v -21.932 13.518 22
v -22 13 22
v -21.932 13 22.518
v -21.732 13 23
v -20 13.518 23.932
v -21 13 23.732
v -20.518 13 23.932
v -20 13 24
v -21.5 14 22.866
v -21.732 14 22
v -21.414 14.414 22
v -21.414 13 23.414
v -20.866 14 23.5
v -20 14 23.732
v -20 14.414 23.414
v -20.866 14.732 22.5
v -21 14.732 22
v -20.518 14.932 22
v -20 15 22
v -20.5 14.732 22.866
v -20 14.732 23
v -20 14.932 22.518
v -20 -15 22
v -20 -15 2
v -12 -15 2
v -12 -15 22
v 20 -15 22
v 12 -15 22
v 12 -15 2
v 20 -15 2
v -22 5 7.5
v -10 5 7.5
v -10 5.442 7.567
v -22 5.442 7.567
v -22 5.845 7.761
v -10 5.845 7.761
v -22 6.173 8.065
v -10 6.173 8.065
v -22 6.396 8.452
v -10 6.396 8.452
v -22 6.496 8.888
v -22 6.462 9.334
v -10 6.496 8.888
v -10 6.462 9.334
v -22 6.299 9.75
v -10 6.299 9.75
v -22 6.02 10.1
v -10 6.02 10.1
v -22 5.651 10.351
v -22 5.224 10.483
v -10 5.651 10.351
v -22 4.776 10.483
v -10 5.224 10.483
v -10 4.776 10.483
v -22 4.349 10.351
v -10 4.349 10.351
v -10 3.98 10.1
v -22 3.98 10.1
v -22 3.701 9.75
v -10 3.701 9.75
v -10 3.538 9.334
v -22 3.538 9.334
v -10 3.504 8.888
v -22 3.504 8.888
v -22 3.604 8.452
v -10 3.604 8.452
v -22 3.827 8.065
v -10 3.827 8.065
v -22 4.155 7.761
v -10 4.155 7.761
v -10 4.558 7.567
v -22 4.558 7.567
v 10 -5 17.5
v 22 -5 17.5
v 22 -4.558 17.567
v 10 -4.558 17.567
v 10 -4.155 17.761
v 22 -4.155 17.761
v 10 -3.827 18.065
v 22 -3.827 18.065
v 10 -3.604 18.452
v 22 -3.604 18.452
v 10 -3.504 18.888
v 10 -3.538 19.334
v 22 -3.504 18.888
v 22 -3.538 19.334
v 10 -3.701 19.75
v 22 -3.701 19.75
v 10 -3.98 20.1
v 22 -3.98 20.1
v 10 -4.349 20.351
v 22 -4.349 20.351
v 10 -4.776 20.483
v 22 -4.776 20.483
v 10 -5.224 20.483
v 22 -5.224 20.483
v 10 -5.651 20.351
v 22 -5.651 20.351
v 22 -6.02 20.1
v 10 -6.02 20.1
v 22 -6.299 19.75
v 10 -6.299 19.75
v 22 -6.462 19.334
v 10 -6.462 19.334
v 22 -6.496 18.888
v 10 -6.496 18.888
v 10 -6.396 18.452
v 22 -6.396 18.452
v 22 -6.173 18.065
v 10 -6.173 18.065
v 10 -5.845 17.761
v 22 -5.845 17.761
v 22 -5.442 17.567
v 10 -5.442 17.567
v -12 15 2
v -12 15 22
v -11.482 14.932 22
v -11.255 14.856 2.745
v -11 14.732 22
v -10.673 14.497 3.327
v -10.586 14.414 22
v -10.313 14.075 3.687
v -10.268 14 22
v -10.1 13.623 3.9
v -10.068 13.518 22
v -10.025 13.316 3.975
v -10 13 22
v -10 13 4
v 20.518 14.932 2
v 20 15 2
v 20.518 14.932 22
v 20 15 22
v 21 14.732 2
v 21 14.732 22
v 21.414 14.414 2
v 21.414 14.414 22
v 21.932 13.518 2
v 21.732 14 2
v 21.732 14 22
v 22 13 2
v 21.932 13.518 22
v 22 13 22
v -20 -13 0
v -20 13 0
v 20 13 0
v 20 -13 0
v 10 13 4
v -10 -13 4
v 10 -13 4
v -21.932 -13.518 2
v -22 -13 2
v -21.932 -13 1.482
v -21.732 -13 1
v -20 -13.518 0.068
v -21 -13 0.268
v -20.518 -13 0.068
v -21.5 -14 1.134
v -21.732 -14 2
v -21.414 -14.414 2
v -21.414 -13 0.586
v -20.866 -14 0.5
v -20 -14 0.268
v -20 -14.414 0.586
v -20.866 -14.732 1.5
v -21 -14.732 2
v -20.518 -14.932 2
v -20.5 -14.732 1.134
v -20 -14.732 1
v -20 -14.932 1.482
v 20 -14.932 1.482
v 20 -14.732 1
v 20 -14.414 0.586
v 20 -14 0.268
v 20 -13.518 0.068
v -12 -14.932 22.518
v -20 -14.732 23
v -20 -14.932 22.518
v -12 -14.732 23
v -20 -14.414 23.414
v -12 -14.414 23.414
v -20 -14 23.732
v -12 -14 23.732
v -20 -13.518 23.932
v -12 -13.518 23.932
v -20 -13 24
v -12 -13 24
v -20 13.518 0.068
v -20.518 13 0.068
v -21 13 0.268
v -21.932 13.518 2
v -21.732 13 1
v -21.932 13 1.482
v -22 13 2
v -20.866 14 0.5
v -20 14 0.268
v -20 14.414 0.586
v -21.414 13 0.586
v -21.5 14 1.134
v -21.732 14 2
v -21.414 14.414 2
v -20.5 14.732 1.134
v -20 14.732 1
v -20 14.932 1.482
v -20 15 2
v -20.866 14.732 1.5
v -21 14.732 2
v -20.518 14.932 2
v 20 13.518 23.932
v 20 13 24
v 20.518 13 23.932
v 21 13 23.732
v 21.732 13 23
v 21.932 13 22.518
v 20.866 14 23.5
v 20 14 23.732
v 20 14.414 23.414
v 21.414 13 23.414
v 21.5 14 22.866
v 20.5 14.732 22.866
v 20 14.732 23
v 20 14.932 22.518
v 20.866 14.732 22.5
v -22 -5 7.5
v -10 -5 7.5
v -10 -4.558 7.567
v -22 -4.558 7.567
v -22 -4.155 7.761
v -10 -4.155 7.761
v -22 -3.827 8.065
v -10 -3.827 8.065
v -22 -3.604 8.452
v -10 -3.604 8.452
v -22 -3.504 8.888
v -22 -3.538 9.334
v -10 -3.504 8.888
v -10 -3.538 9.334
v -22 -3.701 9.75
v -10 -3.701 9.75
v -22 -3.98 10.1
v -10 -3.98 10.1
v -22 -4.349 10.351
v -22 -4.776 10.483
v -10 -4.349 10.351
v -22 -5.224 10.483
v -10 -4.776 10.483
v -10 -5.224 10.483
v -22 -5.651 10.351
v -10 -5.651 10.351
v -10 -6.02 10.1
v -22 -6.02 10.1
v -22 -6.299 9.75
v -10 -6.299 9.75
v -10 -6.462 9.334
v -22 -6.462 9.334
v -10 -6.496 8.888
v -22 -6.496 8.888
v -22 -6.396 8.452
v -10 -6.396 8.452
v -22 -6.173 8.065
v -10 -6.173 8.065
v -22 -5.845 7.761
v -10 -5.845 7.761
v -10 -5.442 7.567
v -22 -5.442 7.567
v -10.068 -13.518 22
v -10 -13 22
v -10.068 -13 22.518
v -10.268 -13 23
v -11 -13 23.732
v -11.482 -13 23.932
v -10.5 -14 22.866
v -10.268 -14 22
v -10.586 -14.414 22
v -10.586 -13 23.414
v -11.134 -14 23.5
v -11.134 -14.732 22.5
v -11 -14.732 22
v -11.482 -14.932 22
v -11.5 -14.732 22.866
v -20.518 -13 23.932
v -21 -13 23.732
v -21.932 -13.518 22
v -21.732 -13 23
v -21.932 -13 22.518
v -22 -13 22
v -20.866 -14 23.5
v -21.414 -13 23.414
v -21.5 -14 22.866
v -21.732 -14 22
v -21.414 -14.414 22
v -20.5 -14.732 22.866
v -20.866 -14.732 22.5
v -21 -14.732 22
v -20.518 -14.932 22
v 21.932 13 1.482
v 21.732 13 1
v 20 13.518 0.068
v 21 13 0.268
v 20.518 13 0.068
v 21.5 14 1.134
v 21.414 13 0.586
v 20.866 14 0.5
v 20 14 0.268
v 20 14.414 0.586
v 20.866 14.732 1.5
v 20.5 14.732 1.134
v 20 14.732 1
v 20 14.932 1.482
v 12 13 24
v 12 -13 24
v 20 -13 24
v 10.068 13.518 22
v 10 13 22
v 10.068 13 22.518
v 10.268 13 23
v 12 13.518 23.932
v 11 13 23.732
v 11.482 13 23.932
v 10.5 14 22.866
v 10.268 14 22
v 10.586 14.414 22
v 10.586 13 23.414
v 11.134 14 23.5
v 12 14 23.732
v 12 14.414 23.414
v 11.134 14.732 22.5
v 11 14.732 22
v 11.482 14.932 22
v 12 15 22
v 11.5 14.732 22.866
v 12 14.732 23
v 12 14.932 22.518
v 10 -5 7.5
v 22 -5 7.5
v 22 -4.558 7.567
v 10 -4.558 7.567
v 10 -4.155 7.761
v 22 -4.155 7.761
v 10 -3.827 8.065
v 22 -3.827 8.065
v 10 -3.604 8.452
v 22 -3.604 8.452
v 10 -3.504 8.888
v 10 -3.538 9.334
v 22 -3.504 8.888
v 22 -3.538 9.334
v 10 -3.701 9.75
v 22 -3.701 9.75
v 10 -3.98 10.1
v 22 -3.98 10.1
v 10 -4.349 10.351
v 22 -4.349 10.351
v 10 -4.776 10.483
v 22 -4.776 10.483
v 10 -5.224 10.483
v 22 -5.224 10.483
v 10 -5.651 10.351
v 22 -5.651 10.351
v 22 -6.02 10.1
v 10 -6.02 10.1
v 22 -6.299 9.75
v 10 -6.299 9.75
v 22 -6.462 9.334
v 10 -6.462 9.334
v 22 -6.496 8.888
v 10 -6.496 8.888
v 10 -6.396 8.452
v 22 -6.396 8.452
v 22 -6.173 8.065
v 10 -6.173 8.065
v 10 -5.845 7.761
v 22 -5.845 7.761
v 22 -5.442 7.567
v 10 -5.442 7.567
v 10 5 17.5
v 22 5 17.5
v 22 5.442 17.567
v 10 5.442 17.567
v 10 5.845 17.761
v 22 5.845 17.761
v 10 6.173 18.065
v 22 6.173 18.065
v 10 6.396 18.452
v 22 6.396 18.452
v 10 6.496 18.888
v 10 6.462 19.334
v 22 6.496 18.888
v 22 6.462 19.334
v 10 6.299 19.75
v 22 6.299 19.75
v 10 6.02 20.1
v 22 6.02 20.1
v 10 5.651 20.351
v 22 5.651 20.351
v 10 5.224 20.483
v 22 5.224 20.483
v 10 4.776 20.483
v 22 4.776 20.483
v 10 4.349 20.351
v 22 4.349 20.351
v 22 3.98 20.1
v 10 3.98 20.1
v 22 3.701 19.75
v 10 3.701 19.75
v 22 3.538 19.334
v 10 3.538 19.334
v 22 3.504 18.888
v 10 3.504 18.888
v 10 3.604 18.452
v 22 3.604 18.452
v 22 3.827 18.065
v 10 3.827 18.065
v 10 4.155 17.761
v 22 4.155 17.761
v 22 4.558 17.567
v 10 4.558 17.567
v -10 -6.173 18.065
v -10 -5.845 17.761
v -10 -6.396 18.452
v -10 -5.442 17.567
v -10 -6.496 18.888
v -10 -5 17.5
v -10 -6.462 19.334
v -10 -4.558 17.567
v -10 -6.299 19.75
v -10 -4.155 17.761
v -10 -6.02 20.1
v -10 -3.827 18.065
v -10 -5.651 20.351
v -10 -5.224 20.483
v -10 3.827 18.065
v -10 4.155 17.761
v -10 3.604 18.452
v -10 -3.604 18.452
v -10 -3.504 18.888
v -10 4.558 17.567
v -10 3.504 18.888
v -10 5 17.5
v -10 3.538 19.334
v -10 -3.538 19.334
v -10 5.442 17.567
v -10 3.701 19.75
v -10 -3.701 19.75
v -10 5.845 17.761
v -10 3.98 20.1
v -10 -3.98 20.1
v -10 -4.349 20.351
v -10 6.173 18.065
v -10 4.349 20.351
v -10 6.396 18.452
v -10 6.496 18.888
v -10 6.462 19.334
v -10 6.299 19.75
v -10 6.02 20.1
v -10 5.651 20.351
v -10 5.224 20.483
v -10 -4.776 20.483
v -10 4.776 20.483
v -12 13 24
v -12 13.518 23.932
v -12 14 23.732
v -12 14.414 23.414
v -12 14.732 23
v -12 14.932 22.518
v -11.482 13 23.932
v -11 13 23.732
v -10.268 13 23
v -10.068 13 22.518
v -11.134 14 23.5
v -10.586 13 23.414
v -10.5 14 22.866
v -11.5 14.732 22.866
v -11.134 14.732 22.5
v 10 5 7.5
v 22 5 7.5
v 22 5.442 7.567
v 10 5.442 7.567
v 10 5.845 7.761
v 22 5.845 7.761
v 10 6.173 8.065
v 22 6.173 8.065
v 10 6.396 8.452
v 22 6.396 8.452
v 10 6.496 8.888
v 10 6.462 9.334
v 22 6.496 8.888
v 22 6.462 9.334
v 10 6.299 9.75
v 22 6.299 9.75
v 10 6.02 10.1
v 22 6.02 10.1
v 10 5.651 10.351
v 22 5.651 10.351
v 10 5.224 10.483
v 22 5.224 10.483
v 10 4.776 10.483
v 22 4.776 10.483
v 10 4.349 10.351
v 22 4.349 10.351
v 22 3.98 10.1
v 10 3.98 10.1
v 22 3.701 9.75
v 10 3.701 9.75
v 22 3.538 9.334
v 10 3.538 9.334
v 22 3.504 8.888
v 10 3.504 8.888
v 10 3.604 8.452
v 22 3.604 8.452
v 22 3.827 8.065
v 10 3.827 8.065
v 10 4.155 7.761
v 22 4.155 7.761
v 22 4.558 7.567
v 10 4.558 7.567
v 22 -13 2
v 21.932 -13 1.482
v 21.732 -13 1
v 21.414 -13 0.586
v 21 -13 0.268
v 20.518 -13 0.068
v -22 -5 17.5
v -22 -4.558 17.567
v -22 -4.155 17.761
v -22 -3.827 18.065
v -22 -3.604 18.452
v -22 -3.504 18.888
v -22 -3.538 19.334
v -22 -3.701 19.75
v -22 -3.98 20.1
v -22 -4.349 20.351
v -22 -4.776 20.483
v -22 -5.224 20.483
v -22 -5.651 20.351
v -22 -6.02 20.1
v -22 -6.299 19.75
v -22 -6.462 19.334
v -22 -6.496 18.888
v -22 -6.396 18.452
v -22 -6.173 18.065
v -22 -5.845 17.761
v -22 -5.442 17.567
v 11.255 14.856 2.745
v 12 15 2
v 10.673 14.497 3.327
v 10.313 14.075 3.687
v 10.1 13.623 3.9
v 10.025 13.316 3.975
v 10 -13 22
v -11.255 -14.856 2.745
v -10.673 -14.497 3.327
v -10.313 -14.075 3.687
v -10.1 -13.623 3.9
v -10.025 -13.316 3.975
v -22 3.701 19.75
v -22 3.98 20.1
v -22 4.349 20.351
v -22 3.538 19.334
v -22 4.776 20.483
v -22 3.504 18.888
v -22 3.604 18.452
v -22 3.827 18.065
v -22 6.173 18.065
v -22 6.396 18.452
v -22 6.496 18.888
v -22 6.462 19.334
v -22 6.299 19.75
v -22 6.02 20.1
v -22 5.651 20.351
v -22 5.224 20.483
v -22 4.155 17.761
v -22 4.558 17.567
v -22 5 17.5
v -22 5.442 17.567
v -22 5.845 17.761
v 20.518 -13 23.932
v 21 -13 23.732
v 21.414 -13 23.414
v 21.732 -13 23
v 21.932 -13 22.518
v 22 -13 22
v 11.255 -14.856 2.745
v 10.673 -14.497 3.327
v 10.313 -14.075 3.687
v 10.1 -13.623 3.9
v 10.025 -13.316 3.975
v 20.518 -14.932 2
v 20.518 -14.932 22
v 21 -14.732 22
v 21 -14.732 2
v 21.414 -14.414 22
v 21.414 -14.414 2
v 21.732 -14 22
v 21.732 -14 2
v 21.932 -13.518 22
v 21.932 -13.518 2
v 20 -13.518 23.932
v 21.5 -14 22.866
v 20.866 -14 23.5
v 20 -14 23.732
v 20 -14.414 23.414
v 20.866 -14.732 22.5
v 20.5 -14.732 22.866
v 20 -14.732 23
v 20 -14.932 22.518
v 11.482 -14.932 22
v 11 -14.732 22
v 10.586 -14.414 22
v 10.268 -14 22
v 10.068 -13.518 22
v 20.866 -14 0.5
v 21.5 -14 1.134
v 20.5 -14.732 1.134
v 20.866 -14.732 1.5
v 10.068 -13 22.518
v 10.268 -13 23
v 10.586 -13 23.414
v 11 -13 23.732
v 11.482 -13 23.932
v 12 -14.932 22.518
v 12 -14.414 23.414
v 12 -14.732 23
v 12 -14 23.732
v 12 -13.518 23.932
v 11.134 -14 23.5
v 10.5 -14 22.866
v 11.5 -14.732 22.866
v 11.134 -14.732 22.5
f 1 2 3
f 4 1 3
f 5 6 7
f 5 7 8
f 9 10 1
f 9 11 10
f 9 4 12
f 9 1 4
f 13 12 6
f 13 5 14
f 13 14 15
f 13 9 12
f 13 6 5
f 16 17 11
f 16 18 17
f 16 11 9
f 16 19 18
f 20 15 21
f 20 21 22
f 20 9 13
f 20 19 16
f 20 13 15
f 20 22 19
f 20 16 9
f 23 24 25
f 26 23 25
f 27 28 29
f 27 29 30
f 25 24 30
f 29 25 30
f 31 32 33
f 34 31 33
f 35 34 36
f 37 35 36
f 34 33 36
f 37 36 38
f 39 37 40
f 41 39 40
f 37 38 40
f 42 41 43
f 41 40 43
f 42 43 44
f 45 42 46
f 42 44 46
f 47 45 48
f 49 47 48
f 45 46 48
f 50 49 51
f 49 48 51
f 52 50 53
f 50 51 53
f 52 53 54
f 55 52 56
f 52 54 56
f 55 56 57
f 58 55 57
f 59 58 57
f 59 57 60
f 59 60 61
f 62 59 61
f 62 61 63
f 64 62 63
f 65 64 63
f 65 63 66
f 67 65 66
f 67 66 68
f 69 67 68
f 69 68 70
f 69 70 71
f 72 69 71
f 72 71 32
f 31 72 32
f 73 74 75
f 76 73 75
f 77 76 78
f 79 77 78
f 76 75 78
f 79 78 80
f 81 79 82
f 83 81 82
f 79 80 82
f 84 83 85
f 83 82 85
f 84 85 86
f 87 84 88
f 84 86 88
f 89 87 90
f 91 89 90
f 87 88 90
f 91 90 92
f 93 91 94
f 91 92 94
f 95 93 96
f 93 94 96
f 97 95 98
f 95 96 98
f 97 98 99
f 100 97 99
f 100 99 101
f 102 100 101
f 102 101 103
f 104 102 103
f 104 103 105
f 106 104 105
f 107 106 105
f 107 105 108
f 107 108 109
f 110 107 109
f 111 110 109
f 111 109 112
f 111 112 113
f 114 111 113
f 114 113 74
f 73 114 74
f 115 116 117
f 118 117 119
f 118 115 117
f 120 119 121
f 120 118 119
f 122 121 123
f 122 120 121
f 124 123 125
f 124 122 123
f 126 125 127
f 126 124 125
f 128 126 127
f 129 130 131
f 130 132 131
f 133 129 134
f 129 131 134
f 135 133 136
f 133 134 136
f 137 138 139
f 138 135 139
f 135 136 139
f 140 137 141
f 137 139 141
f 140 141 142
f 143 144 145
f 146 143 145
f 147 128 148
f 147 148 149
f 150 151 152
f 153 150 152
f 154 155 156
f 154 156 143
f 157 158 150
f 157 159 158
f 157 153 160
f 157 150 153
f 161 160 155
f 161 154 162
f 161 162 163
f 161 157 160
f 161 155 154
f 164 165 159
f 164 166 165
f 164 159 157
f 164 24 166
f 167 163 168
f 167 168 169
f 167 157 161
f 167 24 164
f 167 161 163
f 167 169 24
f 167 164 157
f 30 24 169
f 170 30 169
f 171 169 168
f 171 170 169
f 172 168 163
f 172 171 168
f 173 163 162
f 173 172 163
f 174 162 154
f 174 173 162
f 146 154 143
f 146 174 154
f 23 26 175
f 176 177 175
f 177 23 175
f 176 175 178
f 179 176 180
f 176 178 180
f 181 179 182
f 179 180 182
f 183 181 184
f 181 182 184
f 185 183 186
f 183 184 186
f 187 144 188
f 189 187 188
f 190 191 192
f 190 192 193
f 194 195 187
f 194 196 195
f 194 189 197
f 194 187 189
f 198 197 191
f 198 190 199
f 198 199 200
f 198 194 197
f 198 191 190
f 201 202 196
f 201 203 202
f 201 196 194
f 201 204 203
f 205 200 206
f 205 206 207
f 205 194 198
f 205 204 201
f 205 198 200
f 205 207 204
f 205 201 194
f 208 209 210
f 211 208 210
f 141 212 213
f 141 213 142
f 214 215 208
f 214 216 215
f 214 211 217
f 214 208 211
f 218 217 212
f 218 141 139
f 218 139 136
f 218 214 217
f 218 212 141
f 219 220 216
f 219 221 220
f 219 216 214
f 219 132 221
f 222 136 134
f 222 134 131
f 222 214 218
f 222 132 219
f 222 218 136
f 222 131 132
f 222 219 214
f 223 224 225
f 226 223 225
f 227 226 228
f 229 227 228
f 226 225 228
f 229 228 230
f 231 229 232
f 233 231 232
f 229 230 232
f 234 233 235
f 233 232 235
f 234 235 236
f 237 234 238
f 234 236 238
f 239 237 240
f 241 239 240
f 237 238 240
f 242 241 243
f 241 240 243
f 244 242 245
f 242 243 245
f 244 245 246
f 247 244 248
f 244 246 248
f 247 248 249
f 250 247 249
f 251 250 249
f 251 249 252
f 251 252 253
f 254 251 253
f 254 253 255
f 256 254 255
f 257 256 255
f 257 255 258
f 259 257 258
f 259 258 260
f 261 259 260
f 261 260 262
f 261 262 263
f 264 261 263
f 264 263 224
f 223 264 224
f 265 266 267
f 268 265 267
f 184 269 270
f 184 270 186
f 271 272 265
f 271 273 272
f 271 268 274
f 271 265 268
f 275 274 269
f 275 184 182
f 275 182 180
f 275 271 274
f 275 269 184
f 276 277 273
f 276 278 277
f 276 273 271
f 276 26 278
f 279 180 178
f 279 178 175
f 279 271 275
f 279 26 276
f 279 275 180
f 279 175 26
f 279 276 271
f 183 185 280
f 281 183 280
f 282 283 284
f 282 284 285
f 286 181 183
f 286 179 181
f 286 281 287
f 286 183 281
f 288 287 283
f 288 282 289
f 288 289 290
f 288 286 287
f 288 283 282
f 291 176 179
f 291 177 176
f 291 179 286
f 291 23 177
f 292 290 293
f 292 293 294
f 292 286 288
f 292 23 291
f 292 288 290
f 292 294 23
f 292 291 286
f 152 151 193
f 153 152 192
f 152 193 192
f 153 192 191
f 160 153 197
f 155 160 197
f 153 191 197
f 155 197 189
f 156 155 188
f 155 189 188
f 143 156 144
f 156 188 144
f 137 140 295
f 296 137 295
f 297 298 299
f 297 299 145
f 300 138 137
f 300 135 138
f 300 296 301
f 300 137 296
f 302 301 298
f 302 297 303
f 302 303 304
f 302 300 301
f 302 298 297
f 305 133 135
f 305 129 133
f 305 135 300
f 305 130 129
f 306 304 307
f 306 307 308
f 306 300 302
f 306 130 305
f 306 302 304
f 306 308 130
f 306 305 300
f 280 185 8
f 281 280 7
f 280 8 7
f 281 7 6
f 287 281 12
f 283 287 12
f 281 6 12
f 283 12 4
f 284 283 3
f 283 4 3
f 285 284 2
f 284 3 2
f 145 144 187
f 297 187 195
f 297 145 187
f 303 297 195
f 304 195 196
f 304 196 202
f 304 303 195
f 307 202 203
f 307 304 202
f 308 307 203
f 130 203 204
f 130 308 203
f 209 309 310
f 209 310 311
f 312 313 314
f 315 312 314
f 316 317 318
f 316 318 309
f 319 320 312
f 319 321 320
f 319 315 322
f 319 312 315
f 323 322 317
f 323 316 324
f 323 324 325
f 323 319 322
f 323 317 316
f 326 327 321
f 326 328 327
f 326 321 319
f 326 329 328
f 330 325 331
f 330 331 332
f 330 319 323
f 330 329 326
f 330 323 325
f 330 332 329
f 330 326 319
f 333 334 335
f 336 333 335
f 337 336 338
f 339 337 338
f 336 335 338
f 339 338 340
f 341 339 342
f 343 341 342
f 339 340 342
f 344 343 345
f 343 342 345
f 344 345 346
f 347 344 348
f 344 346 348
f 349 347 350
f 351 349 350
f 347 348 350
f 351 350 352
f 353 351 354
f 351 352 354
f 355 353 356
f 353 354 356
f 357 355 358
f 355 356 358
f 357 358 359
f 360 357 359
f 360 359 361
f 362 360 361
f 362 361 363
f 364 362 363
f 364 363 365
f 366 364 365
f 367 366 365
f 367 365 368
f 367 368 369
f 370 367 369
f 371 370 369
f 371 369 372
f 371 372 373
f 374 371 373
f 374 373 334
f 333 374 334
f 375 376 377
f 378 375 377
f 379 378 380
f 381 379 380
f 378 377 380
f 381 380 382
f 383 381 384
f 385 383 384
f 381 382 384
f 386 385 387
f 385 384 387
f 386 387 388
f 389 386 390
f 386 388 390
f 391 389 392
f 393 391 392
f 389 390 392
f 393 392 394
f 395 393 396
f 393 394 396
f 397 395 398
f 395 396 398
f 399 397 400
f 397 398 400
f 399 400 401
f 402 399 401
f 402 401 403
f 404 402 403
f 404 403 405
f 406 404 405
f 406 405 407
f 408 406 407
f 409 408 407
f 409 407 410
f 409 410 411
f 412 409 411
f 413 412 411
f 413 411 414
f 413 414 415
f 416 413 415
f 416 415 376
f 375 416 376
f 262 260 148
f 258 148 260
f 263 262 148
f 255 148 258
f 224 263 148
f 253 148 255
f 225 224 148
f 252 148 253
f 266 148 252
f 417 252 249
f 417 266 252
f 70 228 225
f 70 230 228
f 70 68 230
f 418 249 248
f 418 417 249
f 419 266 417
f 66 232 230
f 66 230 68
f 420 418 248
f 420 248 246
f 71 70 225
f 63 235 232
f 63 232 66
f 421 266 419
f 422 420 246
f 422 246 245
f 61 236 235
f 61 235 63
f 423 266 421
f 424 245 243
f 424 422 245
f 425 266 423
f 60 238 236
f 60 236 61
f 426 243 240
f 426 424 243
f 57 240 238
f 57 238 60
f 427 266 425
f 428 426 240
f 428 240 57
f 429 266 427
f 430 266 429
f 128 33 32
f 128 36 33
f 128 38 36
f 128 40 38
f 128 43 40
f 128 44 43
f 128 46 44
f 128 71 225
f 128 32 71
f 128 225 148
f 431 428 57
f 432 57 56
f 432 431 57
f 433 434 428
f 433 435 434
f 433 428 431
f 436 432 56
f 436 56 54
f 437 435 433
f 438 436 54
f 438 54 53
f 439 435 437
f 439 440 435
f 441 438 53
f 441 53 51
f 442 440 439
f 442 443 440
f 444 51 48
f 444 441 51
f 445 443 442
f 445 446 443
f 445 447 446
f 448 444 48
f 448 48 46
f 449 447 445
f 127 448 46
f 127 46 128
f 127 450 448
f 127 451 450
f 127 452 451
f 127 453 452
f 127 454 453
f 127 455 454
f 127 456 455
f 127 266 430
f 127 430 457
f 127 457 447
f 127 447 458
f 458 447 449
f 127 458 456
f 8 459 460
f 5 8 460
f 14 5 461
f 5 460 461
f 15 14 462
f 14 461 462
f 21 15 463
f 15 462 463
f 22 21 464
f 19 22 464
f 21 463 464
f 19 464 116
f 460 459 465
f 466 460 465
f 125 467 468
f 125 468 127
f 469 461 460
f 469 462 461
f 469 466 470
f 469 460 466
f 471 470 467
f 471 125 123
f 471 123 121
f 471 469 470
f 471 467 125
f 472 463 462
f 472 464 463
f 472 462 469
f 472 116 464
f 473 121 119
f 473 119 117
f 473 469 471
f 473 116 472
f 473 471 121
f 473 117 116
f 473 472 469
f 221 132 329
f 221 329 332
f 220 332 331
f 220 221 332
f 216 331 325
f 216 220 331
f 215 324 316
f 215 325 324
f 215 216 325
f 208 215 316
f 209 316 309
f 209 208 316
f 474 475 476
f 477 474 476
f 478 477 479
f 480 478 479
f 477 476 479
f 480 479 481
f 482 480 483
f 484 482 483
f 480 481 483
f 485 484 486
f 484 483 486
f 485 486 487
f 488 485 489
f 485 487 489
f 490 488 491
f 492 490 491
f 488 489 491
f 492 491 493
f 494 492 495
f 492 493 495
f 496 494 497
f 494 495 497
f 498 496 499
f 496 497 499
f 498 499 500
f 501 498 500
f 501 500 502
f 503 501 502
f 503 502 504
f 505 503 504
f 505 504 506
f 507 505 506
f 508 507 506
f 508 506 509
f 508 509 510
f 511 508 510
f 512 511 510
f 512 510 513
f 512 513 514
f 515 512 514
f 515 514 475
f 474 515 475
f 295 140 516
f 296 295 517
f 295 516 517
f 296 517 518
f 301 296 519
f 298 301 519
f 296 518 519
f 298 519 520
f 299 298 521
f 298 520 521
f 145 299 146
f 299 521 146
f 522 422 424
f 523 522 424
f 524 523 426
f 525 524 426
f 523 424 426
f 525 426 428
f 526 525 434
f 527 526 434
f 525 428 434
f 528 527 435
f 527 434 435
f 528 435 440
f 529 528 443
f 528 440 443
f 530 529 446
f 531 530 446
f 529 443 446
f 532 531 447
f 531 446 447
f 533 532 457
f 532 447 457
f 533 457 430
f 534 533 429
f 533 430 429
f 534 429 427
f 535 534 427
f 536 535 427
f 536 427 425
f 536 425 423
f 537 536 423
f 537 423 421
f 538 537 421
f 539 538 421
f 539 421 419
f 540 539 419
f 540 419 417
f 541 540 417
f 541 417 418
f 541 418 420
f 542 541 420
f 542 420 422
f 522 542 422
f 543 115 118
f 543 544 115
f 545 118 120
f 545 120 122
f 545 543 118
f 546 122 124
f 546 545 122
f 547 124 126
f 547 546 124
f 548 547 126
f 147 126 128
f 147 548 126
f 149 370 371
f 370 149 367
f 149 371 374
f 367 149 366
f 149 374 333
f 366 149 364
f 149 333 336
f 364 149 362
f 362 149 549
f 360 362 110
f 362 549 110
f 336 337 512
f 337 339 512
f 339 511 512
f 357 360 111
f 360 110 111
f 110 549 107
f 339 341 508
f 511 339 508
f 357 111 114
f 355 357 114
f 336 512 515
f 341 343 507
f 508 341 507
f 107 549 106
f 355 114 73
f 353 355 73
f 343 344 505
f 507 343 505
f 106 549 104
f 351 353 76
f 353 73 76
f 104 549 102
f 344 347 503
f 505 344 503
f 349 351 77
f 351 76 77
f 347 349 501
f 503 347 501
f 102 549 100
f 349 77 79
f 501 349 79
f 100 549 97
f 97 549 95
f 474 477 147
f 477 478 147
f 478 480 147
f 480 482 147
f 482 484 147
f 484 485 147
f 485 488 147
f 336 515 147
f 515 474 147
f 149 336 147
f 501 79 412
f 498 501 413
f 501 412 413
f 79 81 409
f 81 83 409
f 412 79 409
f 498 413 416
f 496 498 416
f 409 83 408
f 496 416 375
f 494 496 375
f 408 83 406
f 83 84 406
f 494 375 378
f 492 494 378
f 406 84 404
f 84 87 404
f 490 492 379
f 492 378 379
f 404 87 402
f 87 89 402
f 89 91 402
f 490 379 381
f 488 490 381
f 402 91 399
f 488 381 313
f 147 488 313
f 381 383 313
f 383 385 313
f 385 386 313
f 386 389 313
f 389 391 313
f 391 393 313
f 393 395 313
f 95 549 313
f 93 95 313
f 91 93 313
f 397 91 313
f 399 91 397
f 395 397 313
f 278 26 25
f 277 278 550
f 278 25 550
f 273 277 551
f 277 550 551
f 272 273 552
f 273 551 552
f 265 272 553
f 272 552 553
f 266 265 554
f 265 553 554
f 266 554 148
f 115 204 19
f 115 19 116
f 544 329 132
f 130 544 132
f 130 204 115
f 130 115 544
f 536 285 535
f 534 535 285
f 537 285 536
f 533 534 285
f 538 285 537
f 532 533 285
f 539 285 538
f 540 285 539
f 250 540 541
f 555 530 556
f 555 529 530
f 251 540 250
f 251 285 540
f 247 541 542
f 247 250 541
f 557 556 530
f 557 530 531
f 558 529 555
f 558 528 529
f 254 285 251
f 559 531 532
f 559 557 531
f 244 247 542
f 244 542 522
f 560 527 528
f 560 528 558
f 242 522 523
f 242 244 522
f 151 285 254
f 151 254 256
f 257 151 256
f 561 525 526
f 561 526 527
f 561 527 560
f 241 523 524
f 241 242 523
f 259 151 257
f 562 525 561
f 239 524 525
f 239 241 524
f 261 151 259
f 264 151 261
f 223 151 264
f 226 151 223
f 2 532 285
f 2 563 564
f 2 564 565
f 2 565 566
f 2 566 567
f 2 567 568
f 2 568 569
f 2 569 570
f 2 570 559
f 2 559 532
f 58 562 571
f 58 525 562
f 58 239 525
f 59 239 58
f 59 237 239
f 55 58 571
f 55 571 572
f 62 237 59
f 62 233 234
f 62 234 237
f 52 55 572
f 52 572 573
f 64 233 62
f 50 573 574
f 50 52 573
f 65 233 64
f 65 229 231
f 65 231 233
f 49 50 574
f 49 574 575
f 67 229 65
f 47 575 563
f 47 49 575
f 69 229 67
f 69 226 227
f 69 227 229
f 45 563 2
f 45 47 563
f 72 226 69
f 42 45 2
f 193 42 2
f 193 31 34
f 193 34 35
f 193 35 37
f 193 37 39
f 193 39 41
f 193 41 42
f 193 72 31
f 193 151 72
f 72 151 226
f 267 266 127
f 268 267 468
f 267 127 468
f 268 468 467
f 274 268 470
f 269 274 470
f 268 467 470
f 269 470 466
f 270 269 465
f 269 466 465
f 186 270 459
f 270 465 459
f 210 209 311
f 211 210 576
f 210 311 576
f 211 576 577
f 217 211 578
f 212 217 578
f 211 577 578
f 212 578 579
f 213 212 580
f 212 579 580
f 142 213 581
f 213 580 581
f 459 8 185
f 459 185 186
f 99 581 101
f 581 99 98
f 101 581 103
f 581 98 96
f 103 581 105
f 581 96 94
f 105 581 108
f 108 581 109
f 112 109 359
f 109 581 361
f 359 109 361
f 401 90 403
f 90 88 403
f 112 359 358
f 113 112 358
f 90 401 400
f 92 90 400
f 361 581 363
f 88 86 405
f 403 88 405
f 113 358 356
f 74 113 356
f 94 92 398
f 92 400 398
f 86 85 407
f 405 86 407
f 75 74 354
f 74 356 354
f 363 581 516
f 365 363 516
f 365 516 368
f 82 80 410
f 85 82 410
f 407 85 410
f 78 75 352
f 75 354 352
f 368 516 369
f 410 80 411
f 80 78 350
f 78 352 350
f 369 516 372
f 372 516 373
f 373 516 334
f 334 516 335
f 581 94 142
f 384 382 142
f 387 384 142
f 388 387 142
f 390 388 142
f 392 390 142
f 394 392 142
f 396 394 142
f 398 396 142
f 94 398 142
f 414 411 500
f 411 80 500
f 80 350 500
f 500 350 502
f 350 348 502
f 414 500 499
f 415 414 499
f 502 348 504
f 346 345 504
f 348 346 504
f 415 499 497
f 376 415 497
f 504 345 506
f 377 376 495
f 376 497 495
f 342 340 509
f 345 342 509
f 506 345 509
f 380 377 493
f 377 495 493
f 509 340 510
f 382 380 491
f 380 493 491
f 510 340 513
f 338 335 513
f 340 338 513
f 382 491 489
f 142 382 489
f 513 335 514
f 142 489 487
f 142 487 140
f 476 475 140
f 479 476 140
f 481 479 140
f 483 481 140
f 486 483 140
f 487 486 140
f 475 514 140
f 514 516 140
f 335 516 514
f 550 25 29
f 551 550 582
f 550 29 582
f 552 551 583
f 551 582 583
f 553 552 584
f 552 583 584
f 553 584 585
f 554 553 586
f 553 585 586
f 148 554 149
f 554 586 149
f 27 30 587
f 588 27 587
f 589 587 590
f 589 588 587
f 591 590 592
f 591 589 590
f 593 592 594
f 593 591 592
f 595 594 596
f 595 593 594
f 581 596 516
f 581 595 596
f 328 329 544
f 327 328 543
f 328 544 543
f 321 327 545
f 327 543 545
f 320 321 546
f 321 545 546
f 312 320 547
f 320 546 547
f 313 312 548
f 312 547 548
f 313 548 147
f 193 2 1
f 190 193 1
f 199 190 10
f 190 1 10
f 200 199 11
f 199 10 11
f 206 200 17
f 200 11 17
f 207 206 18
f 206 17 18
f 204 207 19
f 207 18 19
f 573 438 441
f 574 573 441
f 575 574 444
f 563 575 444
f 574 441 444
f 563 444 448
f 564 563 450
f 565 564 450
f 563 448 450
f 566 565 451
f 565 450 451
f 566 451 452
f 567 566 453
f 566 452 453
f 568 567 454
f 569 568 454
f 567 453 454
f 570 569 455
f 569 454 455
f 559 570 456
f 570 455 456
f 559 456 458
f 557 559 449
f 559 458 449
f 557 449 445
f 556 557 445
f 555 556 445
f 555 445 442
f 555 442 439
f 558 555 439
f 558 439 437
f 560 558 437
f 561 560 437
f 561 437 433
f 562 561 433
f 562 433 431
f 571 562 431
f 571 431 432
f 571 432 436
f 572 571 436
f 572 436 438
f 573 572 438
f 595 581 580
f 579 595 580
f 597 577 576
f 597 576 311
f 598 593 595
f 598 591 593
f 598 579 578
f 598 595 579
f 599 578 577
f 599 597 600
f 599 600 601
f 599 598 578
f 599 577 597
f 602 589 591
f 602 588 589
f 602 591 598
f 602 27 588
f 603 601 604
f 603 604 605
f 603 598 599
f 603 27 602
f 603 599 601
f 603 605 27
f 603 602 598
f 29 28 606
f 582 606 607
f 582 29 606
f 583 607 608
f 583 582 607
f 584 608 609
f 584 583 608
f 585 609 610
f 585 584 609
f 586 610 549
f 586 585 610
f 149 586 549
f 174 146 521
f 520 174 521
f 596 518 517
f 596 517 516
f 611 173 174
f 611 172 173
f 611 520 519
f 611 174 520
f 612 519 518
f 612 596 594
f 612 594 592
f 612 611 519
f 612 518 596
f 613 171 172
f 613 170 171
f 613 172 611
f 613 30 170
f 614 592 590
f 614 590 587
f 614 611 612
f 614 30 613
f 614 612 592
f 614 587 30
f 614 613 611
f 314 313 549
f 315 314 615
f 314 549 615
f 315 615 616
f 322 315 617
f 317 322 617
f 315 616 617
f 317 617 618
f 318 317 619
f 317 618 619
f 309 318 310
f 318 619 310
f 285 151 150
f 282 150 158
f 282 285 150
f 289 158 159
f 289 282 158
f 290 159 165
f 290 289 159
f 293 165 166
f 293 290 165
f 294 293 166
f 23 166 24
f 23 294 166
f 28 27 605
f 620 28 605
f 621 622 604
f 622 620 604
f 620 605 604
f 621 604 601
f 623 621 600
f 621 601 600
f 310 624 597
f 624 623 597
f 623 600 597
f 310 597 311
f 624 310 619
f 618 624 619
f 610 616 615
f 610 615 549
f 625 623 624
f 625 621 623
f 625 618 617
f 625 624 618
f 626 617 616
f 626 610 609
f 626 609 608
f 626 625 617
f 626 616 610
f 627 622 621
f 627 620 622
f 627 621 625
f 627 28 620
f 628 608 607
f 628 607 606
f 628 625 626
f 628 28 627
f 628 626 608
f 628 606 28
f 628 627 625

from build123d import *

# Parameters (mm, degrees)
SKETCH_1_W          = 44
SKETCH_1_H          = 30
EXTRUDE_1_DEPTH     = 24
SKETCH_5_W          = 20
SKETCH_5_H          = 34.070761632
CUT_EXTRUDE_3_DEPTH = 20
SKETCH_6_R          = 1.5
CUT_EXTRUDE_4_DEPTH = 44
FILLET_1_R          = 2
FILLET_2_R          = 2


# Some blends are built 0.0001 mm under size
with BuildPart() as part:
    # 草图1 → 凸台-拉伸1 (new body)
    with BuildSketch(Plane.XY):
        Rectangle(SKETCH_1_W, SKETCH_1_H)
    extrude(amount=EXTRUDE_1_DEPTH)

    # 草图5 → 切除-拉伸3 (cut)
    with BuildSketch(Plane.XY.offset(24)):
        with Locations((0, 0.619885825)):
            Rectangle(SKETCH_5_W, SKETCH_5_H)
    extrude(amount=-CUT_EXTRUDE_3_DEPTH, mode=Mode.SUBTRACT)

    # 草图6 → 切除-拉伸4 (cut)
    with BuildSketch(Plane(origin=(22, 0, 0), x_dir=(0, 0, -1), z_dir=(1, 0, 0))):
        with Locations((-19, 5)):
            Circle(SKETCH_6_R)
        with Locations((-19, -5)):
            Circle(SKETCH_6_R)
        with Locations((-9, -5)):
            Circle(SKETCH_6_R)
        with Locations((-9, 5)):
            Circle(SKETCH_6_R)
    extrude(amount=-CUT_EXTRUDE_4_DEPTH, mode=Mode.SUBTRACT)

    # 圆角1
    fillet_1_edges = [part.edges().sort_by_distance(p)[0] for p in [
        (-16, -15, 24),
        (-16, 15, 24),
        (16, -15, 24),
        (0, -15, 4),
        (0, 15, 4),
        (-10, 15, 14),
        (-10, -15, 14),
        (10, 15, 14),
        (10, -15, 14),
        (0, -15, 0),
        (0, 15, 0),
        (16, 15, 24),
        (22, -15, 12),
        (-22, -15, 12),
        (-22, 15, 12),
        (22, 15, 12),
    ]]
    fillet(fillet_1_edges, radius=FILLET_1_R - 0.0001)  # a hair under: the kernel refuses the full size

    # 圆角2
    # the kernel refuses this fillet: 2 mm, written as the material it takes off along each edge
    with BuildSketch(Plane(origin=(-12, -15, 22), x_dir=(1, 0, 0), z_dir=(0, 0, -1))) as fillet_2_piece_1:
        with BuildLine():
            CenterArc((0.0001, -1.9999), 1.9999, 0, 90)
            Line((2, -1.9999), (2, 0))
            Line((2, 0), (0.0001, 0))
        make_face()
    revolve(axis=Axis((-12, -15, 22), (0, -1, 0)), revolution_arc=90, mode=Mode.SUBTRACT)
    with BuildSketch(Plane(origin=(-20, -15, 22), x_dir=(0, 0, 1), z_dir=(1, 0, 0))) as fillet_2_piece_2:
        with BuildLine():
            CenterArc((0.0001, -1.9999), 1.9999, 0, 90)
            Line((2, -1.9999), (2, 0))
            Line((2, 0), (0.0001, 0))
        make_face()
    revolve(axis=Axis((-20, -15, 22), (0, -1, 0)), revolution_arc=90, mode=Mode.SUBTRACT)
    with BuildSketch(Plane(origin=(-20, -15, 2), x_dir=(-1, 0, 0), z_dir=(0, 0, 1))) as fillet_2_piece_3:
        with BuildLine():
            CenterArc((0.0001, -1.9999), 1.9999, 0, 90)
            Line((2, -1.9999), (2, 0))
            Line((2, 0), (0.0001, 0))
        make_face()
    revolve(axis=Axis((-20, -15, 2), (0, -1, 0)), revolution_arc=90, mode=Mode.SUBTRACT)
    with BuildSketch(Plane(origin=(20, -15, 2), x_dir=(0, 0, -1), z_dir=(-1, 0, 0))) as fillet_2_piece_4:
        with BuildLine():
            CenterArc((0.0001, -1.9999), 1.9999, 0, 90)
            Line((2, -1.9999), (2, 0))
            Line((2, 0), (0.0001, 0))
        make_face()
    revolve(axis=Axis((20, -15, 2), (0, -1, 0)), revolution_arc=90, mode=Mode.SUBTRACT)
    with BuildSketch(Plane(origin=(12, -15, 22), x_dir=(0, 0, 1), z_dir=(1, 0, 0))) as fillet_2_piece_5:
        with BuildLine():
            CenterArc((0.0001, -1.9999), 1.9999, 0, 90)
            Line((2, -1.9999), (2, 0))
            Line((2, 0), (0.0001, 0))
        make_face()
    revolve(axis=Axis((12, -15, 22), (0, -1, 0)), revolution_arc=90, mode=Mode.SUBTRACT)
    with BuildSketch(Plane(origin=(20, -15, 22), x_dir=(1, 0, 0), z_dir=(0, 0, -1))) as fillet_2_piece_6:
        with BuildLine():
            CenterArc((0.0001, -1.9999), 1.9999, 0, 90)
            Line((2, -1.9999), (2, 0))
            Line((2, 0), (0.0001, 0))
        make_face()
    revolve(axis=Axis((20, -15, 22), (0, -1, 0)), revolution_arc=90, mode=Mode.SUBTRACT)
    with BuildSketch(Plane(origin=(12, 15, 22), x_dir=(-1, 0, 0), z_dir=(0, 0, -1))) as fillet_2_piece_7:
        with BuildLine():
            CenterArc((0.0001, -1.9999), 1.9999, 0, 90)
            Line((2, -1.9999), (2, 0))
            Line((2, 0), (0.0001, 0))
        make_face()
    revolve(axis=Axis((12, 15, 22), (0, 1, 0)), revolution_arc=90, mode=Mode.SUBTRACT)
    with BuildSketch(Plane(origin=(20, 15, 22), x_dir=(0, 0, 1), z_dir=(-1, 0, 0))) as fillet_2_piece_8:
        with BuildLine():
            CenterArc((0.0001, -1.9999), 1.9999, 0, 90)
            Line((2, -1.9999), (2, 0))
            Line((2, 0), (0.0001, 0))
        make_face()
    revolve(axis=Axis((20, 15, 22), (0, 1, 0)), revolution_arc=90, mode=Mode.SUBTRACT)
    with BuildSketch(Plane(origin=(-12, 15, 22), x_dir=(0, 0, 1), z_dir=(-1, 0, 0))) as fillet_2_piece_9:
        with BuildLine():
            CenterArc((0.0001, -1.9999), 1.9999, 0, 90)
            Line((2, -1.9999), (2, 0))
            Line((2, 0), (0.0001, 0))
        make_face()
    revolve(axis=Axis((-12, 15, 22), (0, 1, 0)), revolution_arc=90, mode=Mode.SUBTRACT)
    with BuildSketch(Plane(origin=(20, 15, 2), x_dir=(1, 0, 0), z_dir=(0, 0, 1))) as fillet_2_piece_10:
        with BuildLine():
            CenterArc((0.0001, -1.9999), 1.9999, 0, 90)
            Line((2, -1.9999), (2, 0))
            Line((2, 0), (0.0001, 0))
        make_face()
    revolve(axis=Axis((20, 15, 2), (0, 1, 0)), revolution_arc=90, mode=Mode.SUBTRACT)
    with BuildSketch(Plane(origin=(-20, 15, 22), x_dir=(-1, 0, 0), z_dir=(0, 0, -1))) as fillet_2_piece_11:
        with BuildLine():
            CenterArc((0.0001, -1.9999), 1.9999, 0, 90)
            Line((2, -1.9999), (2, 0))
            Line((2, 0), (0.0001, 0))
        make_face()
    revolve(axis=Axis((-20, 15, 22), (0, 1, 0)), revolution_arc=90, mode=Mode.SUBTRACT)
    with BuildSketch(Plane(origin=(-20, 15, 2), x_dir=(0, 0, -1), z_dir=(1, 0, 0))) as fillet_2_piece_12:
        with BuildLine():
            CenterArc((0.0001, -1.9999), 1.9999, 0, 90)
            Line((2, -1.9999), (2, 0))
            Line((2, 0), (0.0001, 0))
        make_face()
    revolve(axis=Axis((-20, 15, 2), (0, 1, 0)), revolution_arc=90, mode=Mode.SUBTRACT)
    with BuildSketch(Plane(origin=(-22, 15, 0), x_dir=(0, 0, 1), z_dir=(0, -1, 0)), Plane(origin=(-22, 15, 24), x_dir=(1, 0, 0), z_dir=(0, -1, 0)), Plane(origin=(10, -15, 24), x_dir=(0, 0, -1), z_dir=(0, 1, 0))) as fillet_2_piece_13:
        with BuildLine():
            CenterArc((FILLET_2_R, -FILLET_2_R), FILLET_2_R, 90, 90)
            Line((0, -FILLET_2_R), (0, 0))
            Line((0, 0), (FILLET_2_R, 0))
        make_face()
    extrude(amount=30, mode=Mode.SUBTRACT)
    with BuildSketch(Plane(origin=(22, -15, 0), x_dir=(-1, 0, 0), z_dir=(0, 1, 0)), Plane(origin=(22, -15, 24), x_dir=(0, 0, -1), z_dir=(0, 1, 0)), Plane(origin=(-10, 15, 24), x_dir=(-1, 0, 0), z_dir=(0, -1, 0))) as fillet_2_piece_14:
        with BuildLine():
            CenterArc((FILLET_2_R, FILLET_2_R), FILLET_2_R, 180, 90)
            Line((0, FILLET_2_R), (0, 0))
            Line((0, 0), (FILLET_2_R, 0))
        make_face()
    extrude(amount=30, mode=Mode.SUBTRACT)


solid = part.part
